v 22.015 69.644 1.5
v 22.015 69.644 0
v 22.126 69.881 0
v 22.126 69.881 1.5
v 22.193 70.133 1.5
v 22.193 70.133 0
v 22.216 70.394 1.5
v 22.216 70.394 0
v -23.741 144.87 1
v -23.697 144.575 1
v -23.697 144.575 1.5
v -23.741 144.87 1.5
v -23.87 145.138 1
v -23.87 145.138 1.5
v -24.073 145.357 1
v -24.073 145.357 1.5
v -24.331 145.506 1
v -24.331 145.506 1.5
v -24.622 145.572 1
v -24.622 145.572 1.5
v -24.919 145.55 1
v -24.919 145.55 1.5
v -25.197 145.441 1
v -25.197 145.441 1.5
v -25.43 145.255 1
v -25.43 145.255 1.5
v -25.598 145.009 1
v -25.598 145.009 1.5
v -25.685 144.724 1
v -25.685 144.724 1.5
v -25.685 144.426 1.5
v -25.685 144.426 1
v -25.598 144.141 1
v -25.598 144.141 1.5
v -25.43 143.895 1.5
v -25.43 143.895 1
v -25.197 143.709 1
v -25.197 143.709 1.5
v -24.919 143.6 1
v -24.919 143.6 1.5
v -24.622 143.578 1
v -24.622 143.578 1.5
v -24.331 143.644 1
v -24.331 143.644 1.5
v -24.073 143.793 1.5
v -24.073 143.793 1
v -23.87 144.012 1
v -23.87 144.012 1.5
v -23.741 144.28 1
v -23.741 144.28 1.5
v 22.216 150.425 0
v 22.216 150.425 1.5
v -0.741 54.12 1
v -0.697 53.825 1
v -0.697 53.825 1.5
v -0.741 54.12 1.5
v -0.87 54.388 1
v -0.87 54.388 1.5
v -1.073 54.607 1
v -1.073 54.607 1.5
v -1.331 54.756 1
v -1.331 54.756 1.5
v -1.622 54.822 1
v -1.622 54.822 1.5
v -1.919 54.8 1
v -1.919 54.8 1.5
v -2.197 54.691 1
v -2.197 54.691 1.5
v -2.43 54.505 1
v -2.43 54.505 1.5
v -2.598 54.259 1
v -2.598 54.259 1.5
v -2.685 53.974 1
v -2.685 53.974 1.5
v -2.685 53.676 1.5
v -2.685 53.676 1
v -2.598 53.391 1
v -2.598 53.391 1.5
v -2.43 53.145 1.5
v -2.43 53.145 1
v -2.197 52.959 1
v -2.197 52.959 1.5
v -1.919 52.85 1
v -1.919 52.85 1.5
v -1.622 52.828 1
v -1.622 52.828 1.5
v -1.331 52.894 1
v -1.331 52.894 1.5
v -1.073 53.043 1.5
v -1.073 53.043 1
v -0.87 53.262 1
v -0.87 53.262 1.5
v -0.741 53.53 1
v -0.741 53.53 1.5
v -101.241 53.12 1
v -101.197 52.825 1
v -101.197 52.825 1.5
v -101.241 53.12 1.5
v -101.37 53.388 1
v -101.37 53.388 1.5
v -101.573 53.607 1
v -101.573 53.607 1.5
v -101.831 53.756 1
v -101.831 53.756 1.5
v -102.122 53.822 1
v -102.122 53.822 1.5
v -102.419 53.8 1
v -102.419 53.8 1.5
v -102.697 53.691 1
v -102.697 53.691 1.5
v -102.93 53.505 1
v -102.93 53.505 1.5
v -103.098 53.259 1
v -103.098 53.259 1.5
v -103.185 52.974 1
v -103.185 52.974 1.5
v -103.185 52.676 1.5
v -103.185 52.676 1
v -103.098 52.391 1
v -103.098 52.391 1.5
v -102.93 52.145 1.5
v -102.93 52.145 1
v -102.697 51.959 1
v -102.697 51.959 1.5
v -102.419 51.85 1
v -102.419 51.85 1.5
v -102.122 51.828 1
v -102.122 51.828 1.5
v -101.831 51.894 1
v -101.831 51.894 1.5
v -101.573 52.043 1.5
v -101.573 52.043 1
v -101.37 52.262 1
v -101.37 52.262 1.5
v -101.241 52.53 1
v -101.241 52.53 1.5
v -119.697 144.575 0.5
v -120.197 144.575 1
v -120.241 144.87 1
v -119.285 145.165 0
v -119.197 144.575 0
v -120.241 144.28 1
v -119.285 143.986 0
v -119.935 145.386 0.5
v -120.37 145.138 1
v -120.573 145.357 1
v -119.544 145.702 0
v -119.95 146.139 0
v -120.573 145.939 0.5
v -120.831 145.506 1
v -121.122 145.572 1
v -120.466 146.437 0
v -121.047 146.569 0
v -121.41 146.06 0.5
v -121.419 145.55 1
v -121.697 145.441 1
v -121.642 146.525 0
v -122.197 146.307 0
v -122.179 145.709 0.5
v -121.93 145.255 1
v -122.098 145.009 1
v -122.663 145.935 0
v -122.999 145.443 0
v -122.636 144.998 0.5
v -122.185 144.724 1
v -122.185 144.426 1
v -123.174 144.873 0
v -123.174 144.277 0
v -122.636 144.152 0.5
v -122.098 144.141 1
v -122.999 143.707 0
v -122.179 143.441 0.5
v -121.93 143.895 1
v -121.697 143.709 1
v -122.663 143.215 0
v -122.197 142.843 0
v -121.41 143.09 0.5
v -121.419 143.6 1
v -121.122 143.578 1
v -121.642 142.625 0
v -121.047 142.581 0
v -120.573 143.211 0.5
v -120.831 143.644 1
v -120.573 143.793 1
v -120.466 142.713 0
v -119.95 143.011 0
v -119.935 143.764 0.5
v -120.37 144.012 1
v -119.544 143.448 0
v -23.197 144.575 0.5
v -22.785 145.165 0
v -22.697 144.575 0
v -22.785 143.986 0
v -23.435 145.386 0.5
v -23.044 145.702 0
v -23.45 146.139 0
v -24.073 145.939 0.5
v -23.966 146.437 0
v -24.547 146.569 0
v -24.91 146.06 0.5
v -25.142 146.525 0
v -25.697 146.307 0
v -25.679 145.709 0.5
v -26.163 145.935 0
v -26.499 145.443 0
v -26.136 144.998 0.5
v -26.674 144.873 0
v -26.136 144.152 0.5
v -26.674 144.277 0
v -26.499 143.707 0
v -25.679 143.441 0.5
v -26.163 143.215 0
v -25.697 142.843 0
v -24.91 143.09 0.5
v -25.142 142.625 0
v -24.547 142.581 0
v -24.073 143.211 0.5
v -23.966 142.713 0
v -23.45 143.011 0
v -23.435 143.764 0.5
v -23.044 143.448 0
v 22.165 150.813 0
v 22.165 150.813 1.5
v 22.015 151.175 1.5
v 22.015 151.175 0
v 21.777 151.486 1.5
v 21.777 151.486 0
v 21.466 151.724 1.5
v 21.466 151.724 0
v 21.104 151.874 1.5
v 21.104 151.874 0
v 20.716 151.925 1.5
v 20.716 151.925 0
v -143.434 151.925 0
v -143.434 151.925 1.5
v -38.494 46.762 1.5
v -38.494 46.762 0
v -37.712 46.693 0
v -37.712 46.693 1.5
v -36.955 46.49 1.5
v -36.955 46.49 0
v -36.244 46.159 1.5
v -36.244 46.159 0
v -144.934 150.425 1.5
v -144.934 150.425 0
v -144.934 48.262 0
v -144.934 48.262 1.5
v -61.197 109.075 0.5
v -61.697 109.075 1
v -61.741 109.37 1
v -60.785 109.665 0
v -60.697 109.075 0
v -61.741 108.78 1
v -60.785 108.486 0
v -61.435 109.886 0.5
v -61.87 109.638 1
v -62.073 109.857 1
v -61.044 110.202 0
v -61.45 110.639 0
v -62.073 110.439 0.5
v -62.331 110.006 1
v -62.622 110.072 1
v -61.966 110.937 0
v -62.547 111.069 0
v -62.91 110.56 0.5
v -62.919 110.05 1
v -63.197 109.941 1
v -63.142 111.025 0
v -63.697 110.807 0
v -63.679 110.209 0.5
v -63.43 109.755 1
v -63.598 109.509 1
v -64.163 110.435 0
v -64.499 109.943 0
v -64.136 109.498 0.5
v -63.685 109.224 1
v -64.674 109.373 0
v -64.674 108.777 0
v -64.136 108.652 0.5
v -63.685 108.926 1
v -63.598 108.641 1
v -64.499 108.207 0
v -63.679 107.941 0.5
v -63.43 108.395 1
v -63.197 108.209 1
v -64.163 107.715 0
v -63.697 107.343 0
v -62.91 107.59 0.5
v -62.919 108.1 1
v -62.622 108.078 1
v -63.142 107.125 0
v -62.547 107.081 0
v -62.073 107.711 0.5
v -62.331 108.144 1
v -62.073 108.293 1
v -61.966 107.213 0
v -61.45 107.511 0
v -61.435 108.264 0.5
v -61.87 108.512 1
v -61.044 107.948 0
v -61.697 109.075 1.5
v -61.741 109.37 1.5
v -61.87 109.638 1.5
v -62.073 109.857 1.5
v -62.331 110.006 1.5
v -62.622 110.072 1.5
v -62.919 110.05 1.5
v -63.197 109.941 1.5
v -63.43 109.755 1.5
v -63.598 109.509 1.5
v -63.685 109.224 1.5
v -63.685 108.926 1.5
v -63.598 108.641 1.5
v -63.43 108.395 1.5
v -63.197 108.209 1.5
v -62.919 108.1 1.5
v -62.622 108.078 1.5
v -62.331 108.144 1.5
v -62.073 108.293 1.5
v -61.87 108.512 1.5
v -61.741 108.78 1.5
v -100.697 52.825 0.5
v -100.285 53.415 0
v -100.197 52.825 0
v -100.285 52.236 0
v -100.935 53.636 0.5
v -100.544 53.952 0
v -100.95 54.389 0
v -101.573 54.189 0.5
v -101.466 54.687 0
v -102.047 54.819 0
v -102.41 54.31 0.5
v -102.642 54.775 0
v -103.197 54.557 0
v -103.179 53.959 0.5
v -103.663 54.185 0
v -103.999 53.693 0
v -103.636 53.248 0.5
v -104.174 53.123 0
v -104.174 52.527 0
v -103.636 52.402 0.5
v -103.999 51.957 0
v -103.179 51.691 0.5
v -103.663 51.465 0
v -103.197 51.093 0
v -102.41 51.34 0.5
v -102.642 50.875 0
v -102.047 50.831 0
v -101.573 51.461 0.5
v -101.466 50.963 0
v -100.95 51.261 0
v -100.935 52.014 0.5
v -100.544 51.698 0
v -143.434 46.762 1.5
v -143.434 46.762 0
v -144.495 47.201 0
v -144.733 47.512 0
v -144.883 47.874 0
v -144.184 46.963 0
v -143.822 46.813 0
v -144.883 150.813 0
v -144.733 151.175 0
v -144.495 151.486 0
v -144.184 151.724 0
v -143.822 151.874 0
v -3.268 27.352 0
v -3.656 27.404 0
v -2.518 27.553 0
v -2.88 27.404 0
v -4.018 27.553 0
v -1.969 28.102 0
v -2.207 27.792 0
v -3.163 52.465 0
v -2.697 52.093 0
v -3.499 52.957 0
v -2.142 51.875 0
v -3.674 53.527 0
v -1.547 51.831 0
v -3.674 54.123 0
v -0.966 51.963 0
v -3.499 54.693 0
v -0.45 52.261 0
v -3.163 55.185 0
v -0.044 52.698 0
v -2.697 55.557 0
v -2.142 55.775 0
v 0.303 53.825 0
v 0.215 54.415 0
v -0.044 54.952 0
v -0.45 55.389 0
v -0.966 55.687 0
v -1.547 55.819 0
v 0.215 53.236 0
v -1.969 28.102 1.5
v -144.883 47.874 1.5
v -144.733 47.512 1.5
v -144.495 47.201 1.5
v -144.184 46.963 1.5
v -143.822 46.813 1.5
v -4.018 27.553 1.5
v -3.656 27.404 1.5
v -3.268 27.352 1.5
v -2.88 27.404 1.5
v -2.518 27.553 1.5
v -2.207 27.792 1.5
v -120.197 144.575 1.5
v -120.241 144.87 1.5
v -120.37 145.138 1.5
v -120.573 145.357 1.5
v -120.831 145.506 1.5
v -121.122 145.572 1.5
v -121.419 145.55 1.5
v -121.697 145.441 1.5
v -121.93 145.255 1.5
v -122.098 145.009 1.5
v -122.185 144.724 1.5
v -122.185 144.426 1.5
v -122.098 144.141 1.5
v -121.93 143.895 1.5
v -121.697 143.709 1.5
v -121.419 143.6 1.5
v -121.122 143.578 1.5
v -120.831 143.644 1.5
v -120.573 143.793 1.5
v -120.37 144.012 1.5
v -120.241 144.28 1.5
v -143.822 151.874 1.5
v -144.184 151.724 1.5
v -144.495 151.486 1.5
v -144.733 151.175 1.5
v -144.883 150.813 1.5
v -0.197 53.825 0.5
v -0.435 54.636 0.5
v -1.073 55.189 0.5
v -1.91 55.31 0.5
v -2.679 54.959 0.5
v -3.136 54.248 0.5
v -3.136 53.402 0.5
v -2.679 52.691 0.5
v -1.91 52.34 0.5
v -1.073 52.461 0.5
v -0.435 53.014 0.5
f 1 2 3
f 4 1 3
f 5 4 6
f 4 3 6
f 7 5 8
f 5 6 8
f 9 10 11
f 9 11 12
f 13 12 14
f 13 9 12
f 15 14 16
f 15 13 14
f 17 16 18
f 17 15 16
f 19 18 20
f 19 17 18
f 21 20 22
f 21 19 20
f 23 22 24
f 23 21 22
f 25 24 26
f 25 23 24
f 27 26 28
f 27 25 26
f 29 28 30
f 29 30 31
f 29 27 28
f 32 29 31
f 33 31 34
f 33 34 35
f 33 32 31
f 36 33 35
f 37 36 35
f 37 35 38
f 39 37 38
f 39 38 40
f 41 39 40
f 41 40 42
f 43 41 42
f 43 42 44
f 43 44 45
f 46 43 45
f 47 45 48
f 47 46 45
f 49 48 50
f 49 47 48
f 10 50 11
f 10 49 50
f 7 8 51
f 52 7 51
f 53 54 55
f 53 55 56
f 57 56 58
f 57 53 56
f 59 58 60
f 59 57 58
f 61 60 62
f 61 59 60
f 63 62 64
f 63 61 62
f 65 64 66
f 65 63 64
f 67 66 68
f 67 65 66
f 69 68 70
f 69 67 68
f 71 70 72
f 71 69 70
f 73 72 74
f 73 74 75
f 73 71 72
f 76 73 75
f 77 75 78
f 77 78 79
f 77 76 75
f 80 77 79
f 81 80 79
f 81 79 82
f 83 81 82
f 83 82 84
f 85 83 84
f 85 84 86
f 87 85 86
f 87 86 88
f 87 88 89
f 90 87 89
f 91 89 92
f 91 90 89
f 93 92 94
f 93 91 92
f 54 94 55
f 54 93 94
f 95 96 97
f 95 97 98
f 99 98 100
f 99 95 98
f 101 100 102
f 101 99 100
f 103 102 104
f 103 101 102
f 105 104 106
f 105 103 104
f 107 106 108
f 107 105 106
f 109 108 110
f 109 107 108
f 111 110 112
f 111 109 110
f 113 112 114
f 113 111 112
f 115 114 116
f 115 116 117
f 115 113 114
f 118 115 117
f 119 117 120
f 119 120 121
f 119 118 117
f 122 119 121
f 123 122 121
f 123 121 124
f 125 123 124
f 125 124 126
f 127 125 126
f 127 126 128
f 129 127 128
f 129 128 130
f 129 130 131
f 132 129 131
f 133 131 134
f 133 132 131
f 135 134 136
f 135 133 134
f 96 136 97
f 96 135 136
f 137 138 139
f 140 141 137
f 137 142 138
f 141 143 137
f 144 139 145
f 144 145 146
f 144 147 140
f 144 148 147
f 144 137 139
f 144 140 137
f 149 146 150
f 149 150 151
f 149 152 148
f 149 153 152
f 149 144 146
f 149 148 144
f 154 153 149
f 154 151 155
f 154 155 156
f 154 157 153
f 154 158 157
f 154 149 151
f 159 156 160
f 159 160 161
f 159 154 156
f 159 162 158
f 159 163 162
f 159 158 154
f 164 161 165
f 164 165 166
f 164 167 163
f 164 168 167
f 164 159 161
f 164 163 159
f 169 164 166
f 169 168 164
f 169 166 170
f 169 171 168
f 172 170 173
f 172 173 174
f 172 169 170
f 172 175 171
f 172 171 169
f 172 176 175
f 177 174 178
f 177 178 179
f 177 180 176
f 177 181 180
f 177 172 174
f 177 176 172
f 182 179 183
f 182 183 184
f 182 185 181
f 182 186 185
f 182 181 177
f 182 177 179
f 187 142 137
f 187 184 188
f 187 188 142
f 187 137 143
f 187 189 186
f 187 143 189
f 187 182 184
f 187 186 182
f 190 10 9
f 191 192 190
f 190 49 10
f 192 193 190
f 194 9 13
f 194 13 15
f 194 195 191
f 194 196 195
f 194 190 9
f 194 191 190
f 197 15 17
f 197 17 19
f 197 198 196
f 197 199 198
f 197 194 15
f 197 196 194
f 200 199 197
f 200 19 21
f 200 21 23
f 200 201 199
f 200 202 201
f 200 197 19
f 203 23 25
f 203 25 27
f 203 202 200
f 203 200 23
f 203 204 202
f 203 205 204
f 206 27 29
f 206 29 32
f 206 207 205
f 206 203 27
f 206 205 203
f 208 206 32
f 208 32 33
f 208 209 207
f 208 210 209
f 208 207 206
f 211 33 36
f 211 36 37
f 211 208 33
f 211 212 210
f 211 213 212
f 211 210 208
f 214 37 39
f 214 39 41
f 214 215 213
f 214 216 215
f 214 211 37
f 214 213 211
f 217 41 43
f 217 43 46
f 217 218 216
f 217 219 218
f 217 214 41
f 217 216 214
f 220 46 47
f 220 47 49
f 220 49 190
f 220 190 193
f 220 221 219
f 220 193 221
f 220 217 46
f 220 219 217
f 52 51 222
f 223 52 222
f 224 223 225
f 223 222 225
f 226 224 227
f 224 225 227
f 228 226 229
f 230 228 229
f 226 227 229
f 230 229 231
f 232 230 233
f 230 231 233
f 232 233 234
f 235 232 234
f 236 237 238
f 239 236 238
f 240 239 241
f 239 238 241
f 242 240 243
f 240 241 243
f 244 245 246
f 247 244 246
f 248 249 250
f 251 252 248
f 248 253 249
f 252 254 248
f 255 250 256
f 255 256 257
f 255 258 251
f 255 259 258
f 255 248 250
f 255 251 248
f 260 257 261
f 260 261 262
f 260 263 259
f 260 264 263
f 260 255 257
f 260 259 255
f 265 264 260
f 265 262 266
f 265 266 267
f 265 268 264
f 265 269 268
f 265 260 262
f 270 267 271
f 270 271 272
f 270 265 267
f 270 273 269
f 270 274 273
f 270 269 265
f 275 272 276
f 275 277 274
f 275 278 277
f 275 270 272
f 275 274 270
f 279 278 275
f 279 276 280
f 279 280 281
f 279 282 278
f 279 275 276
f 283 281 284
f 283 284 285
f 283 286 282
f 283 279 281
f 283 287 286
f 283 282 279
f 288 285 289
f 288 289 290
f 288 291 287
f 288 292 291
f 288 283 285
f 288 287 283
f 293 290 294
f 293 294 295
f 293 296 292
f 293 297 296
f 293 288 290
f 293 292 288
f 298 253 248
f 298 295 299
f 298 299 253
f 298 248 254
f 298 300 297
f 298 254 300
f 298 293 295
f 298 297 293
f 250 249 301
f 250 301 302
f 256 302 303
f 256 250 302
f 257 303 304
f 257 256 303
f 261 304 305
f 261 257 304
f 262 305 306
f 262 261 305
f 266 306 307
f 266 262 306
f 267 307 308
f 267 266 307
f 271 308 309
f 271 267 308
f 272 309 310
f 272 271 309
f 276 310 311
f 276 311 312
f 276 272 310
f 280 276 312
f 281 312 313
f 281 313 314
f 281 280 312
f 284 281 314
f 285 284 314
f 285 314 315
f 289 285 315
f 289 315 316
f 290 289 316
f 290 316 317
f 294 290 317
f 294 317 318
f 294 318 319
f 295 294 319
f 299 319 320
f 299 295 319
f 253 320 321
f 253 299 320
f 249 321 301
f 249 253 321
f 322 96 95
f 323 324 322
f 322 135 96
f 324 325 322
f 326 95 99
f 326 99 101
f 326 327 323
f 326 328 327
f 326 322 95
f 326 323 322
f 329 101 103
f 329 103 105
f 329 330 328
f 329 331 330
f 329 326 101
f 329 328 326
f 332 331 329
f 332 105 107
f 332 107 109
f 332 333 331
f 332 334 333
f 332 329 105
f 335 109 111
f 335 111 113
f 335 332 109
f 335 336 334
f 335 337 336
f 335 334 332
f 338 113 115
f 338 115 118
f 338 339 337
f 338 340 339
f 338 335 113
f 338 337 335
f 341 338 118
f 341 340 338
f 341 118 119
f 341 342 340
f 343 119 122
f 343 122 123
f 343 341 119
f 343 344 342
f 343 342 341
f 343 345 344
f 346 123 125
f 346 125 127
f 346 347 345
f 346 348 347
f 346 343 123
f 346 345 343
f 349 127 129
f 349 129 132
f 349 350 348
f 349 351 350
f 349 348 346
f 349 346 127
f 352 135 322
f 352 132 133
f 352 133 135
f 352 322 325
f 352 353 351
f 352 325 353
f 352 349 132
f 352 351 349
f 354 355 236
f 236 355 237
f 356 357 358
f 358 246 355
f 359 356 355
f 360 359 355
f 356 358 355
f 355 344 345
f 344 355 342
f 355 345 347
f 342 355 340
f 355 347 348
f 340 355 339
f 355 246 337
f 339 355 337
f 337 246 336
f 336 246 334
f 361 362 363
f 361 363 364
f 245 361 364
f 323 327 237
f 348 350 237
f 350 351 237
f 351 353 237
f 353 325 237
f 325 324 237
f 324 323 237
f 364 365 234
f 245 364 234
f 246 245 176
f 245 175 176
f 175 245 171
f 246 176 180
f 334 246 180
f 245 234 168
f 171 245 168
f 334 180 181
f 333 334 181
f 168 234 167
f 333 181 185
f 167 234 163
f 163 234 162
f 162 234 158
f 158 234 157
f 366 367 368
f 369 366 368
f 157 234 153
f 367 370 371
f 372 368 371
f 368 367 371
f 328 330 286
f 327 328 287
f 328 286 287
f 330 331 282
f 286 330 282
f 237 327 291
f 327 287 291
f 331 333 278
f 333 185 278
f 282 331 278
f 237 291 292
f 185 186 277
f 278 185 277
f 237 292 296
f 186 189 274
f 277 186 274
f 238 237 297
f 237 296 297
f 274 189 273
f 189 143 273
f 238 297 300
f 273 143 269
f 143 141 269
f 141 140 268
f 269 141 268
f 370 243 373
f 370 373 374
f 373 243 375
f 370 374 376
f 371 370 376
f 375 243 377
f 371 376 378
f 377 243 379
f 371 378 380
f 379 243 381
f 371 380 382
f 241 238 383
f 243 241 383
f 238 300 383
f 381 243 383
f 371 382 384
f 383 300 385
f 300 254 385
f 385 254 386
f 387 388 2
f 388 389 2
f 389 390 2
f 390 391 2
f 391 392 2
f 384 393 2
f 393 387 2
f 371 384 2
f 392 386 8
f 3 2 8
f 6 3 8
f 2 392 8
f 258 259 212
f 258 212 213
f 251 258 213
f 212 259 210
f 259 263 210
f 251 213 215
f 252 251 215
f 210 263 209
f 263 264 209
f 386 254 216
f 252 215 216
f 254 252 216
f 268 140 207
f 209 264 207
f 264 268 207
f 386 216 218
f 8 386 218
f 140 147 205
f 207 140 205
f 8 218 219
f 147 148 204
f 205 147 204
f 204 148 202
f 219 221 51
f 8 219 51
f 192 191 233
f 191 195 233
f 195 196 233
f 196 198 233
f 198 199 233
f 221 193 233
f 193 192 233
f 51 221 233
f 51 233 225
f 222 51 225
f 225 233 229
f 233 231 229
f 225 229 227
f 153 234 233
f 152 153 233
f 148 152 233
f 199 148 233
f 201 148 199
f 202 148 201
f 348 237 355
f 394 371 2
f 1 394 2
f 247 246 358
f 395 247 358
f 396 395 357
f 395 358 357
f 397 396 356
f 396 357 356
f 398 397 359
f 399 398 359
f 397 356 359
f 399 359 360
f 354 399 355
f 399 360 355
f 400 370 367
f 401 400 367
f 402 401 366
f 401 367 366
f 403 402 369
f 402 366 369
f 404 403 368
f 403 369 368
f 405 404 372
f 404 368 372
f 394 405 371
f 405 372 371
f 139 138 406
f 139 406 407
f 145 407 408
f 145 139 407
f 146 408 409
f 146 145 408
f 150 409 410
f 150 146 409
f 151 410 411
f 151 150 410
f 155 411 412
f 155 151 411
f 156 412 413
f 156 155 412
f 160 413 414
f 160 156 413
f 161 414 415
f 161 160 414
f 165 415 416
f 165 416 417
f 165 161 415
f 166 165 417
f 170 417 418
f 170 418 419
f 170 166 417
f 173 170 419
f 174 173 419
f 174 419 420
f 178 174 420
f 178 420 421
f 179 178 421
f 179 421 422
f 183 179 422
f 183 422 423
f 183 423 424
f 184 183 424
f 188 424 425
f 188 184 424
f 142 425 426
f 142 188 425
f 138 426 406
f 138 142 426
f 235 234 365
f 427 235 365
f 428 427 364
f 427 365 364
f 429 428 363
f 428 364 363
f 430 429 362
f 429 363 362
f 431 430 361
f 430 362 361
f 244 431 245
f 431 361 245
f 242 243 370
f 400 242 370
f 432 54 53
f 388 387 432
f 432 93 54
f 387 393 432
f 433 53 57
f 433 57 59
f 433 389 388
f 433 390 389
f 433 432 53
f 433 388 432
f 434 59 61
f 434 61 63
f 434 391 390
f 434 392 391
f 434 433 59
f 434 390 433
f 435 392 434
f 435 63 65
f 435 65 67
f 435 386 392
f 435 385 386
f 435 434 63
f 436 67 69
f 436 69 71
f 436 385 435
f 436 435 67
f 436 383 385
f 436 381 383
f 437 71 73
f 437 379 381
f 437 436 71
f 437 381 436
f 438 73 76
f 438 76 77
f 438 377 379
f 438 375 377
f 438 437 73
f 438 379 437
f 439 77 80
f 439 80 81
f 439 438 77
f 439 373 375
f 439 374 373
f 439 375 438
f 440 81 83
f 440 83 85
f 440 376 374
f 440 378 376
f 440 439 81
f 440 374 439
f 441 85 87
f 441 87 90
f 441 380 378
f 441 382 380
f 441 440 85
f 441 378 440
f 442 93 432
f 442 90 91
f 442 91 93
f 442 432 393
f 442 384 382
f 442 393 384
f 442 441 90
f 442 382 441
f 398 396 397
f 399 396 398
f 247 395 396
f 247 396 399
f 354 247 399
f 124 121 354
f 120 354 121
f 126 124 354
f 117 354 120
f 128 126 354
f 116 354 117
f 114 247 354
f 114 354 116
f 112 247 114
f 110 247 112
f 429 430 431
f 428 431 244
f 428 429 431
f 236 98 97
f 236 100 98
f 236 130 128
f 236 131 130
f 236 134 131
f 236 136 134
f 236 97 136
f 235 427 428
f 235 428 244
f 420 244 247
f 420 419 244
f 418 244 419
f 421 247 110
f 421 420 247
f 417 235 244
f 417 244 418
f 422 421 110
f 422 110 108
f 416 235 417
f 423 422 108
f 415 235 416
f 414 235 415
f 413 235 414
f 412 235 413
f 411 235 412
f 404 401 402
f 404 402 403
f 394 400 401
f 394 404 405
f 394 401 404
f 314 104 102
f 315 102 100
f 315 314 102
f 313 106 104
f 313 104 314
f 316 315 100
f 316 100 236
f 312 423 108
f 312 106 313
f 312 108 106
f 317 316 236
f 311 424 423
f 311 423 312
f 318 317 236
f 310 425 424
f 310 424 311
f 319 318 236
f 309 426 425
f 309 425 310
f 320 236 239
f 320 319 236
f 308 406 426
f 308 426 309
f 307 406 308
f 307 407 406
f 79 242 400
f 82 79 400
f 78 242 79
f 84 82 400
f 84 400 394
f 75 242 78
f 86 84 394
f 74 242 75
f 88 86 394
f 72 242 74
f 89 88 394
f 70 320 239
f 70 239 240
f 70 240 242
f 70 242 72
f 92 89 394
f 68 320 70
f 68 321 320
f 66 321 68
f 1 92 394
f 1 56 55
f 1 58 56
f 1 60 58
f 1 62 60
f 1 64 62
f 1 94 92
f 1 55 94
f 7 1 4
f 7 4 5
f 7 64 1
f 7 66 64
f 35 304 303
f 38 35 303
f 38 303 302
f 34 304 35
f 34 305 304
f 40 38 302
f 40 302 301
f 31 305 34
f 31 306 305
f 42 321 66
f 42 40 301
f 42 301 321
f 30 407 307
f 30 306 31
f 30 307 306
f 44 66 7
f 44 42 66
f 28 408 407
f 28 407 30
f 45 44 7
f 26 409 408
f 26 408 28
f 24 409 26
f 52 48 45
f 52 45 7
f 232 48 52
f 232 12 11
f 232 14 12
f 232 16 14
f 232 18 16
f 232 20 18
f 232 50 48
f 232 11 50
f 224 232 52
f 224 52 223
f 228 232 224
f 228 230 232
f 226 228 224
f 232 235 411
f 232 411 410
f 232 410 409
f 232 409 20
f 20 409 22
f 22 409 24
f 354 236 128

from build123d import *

# Parameters (mm, degrees)
SKETCH1_R           = 1
BOSS_EXTRUDE1_DEPTH = 1.5
CHAMFER1_SIZE       = 1


with BuildPart() as part:
    # Sketch1 → Boss-Extrude1 (new body)
    with BuildSketch(Plane.XY):
        with BuildLine():
            Line((20.7161288, 151.924941972), (-143.43387189, 151.924941972))
            ThreePointArc((-143.43387189, 151.924941972), (-144.494532062, 151.485602143), (-144.93387189, 150.424941972))
            Line((-144.93387189, 150.424941972), (-144.93387189, 48.261817052))
            ThreePointArc((-144.93387189, 48.261817052), (-144.494532062, 47.20115688), (-143.43387189, 46.761817052))
            Line((-143.43387189, 46.761817052), (-38.493629317, 46.761817052))
            ThreePointArc((-38.493629317, 46.761817052), (-37.328943614, 46.60848327), (-36.243629317, 46.158931369))
            Line((-36.243629317, 46.158931369), (-4.017847382, 27.553367493))
            ThreePointArc((-4.017847382, 27.553367493), (-2.879618836, 27.403516854), (-1.968809299, 28.10240556))
            Line((-1.968809299, 28.10240556), (22.015166883, 69.64386796))
            ThreePointArc((22.015166883, 69.64386796), (22.165017534, 70.005639409), (22.2161288, 70.393867999))
            Line((22.2161288, 70.393867999), (22.2161288, 150.424941972))
            ThreePointArc((22.2161288, 150.424941972), (21.776788972, 151.485602143), (20.7161288, 151.924941972))
        make_face()
        with Locations((-24.69657117, 144.575050352)):
            Circle(SKETCH1_R, mode=Mode.SUBTRACT)
        with Locations((-121.19657121, 144.575050352)):
            Circle(SKETCH1_R, mode=Mode.SUBTRACT)
        with Locations((-62.69657137, 109.075050232)):
            Circle(SKETCH1_R, mode=Mode.SUBTRACT)
        with Locations((-102.19657111, 52.825050972)):
            Circle(SKETCH1_R, mode=Mode.SUBTRACT)
        with Locations((-1.69657145, 53.825048972)):
            Circle(SKETCH1_R, mode=Mode.SUBTRACT)
    extrude(amount=BOSS_EXTRUDE1_DEPTH)

    # Chamfer1
    chamfer1_edges = [part.edges().sort_by_distance(p)[0] for p in [
        (-25.69657117, 144.575050352, 0),
        (-122.19657121, 144.575050352, 0),
        (-63.69657137, 109.075050232, 0),
        (-103.19657111, 52.825050972, 0),
        (-2.69657145, 53.825048972, 0),
    ]]
    chamfer(chamfer1_edges, length=CHAMFER1_SIZE)


solid = part.part
